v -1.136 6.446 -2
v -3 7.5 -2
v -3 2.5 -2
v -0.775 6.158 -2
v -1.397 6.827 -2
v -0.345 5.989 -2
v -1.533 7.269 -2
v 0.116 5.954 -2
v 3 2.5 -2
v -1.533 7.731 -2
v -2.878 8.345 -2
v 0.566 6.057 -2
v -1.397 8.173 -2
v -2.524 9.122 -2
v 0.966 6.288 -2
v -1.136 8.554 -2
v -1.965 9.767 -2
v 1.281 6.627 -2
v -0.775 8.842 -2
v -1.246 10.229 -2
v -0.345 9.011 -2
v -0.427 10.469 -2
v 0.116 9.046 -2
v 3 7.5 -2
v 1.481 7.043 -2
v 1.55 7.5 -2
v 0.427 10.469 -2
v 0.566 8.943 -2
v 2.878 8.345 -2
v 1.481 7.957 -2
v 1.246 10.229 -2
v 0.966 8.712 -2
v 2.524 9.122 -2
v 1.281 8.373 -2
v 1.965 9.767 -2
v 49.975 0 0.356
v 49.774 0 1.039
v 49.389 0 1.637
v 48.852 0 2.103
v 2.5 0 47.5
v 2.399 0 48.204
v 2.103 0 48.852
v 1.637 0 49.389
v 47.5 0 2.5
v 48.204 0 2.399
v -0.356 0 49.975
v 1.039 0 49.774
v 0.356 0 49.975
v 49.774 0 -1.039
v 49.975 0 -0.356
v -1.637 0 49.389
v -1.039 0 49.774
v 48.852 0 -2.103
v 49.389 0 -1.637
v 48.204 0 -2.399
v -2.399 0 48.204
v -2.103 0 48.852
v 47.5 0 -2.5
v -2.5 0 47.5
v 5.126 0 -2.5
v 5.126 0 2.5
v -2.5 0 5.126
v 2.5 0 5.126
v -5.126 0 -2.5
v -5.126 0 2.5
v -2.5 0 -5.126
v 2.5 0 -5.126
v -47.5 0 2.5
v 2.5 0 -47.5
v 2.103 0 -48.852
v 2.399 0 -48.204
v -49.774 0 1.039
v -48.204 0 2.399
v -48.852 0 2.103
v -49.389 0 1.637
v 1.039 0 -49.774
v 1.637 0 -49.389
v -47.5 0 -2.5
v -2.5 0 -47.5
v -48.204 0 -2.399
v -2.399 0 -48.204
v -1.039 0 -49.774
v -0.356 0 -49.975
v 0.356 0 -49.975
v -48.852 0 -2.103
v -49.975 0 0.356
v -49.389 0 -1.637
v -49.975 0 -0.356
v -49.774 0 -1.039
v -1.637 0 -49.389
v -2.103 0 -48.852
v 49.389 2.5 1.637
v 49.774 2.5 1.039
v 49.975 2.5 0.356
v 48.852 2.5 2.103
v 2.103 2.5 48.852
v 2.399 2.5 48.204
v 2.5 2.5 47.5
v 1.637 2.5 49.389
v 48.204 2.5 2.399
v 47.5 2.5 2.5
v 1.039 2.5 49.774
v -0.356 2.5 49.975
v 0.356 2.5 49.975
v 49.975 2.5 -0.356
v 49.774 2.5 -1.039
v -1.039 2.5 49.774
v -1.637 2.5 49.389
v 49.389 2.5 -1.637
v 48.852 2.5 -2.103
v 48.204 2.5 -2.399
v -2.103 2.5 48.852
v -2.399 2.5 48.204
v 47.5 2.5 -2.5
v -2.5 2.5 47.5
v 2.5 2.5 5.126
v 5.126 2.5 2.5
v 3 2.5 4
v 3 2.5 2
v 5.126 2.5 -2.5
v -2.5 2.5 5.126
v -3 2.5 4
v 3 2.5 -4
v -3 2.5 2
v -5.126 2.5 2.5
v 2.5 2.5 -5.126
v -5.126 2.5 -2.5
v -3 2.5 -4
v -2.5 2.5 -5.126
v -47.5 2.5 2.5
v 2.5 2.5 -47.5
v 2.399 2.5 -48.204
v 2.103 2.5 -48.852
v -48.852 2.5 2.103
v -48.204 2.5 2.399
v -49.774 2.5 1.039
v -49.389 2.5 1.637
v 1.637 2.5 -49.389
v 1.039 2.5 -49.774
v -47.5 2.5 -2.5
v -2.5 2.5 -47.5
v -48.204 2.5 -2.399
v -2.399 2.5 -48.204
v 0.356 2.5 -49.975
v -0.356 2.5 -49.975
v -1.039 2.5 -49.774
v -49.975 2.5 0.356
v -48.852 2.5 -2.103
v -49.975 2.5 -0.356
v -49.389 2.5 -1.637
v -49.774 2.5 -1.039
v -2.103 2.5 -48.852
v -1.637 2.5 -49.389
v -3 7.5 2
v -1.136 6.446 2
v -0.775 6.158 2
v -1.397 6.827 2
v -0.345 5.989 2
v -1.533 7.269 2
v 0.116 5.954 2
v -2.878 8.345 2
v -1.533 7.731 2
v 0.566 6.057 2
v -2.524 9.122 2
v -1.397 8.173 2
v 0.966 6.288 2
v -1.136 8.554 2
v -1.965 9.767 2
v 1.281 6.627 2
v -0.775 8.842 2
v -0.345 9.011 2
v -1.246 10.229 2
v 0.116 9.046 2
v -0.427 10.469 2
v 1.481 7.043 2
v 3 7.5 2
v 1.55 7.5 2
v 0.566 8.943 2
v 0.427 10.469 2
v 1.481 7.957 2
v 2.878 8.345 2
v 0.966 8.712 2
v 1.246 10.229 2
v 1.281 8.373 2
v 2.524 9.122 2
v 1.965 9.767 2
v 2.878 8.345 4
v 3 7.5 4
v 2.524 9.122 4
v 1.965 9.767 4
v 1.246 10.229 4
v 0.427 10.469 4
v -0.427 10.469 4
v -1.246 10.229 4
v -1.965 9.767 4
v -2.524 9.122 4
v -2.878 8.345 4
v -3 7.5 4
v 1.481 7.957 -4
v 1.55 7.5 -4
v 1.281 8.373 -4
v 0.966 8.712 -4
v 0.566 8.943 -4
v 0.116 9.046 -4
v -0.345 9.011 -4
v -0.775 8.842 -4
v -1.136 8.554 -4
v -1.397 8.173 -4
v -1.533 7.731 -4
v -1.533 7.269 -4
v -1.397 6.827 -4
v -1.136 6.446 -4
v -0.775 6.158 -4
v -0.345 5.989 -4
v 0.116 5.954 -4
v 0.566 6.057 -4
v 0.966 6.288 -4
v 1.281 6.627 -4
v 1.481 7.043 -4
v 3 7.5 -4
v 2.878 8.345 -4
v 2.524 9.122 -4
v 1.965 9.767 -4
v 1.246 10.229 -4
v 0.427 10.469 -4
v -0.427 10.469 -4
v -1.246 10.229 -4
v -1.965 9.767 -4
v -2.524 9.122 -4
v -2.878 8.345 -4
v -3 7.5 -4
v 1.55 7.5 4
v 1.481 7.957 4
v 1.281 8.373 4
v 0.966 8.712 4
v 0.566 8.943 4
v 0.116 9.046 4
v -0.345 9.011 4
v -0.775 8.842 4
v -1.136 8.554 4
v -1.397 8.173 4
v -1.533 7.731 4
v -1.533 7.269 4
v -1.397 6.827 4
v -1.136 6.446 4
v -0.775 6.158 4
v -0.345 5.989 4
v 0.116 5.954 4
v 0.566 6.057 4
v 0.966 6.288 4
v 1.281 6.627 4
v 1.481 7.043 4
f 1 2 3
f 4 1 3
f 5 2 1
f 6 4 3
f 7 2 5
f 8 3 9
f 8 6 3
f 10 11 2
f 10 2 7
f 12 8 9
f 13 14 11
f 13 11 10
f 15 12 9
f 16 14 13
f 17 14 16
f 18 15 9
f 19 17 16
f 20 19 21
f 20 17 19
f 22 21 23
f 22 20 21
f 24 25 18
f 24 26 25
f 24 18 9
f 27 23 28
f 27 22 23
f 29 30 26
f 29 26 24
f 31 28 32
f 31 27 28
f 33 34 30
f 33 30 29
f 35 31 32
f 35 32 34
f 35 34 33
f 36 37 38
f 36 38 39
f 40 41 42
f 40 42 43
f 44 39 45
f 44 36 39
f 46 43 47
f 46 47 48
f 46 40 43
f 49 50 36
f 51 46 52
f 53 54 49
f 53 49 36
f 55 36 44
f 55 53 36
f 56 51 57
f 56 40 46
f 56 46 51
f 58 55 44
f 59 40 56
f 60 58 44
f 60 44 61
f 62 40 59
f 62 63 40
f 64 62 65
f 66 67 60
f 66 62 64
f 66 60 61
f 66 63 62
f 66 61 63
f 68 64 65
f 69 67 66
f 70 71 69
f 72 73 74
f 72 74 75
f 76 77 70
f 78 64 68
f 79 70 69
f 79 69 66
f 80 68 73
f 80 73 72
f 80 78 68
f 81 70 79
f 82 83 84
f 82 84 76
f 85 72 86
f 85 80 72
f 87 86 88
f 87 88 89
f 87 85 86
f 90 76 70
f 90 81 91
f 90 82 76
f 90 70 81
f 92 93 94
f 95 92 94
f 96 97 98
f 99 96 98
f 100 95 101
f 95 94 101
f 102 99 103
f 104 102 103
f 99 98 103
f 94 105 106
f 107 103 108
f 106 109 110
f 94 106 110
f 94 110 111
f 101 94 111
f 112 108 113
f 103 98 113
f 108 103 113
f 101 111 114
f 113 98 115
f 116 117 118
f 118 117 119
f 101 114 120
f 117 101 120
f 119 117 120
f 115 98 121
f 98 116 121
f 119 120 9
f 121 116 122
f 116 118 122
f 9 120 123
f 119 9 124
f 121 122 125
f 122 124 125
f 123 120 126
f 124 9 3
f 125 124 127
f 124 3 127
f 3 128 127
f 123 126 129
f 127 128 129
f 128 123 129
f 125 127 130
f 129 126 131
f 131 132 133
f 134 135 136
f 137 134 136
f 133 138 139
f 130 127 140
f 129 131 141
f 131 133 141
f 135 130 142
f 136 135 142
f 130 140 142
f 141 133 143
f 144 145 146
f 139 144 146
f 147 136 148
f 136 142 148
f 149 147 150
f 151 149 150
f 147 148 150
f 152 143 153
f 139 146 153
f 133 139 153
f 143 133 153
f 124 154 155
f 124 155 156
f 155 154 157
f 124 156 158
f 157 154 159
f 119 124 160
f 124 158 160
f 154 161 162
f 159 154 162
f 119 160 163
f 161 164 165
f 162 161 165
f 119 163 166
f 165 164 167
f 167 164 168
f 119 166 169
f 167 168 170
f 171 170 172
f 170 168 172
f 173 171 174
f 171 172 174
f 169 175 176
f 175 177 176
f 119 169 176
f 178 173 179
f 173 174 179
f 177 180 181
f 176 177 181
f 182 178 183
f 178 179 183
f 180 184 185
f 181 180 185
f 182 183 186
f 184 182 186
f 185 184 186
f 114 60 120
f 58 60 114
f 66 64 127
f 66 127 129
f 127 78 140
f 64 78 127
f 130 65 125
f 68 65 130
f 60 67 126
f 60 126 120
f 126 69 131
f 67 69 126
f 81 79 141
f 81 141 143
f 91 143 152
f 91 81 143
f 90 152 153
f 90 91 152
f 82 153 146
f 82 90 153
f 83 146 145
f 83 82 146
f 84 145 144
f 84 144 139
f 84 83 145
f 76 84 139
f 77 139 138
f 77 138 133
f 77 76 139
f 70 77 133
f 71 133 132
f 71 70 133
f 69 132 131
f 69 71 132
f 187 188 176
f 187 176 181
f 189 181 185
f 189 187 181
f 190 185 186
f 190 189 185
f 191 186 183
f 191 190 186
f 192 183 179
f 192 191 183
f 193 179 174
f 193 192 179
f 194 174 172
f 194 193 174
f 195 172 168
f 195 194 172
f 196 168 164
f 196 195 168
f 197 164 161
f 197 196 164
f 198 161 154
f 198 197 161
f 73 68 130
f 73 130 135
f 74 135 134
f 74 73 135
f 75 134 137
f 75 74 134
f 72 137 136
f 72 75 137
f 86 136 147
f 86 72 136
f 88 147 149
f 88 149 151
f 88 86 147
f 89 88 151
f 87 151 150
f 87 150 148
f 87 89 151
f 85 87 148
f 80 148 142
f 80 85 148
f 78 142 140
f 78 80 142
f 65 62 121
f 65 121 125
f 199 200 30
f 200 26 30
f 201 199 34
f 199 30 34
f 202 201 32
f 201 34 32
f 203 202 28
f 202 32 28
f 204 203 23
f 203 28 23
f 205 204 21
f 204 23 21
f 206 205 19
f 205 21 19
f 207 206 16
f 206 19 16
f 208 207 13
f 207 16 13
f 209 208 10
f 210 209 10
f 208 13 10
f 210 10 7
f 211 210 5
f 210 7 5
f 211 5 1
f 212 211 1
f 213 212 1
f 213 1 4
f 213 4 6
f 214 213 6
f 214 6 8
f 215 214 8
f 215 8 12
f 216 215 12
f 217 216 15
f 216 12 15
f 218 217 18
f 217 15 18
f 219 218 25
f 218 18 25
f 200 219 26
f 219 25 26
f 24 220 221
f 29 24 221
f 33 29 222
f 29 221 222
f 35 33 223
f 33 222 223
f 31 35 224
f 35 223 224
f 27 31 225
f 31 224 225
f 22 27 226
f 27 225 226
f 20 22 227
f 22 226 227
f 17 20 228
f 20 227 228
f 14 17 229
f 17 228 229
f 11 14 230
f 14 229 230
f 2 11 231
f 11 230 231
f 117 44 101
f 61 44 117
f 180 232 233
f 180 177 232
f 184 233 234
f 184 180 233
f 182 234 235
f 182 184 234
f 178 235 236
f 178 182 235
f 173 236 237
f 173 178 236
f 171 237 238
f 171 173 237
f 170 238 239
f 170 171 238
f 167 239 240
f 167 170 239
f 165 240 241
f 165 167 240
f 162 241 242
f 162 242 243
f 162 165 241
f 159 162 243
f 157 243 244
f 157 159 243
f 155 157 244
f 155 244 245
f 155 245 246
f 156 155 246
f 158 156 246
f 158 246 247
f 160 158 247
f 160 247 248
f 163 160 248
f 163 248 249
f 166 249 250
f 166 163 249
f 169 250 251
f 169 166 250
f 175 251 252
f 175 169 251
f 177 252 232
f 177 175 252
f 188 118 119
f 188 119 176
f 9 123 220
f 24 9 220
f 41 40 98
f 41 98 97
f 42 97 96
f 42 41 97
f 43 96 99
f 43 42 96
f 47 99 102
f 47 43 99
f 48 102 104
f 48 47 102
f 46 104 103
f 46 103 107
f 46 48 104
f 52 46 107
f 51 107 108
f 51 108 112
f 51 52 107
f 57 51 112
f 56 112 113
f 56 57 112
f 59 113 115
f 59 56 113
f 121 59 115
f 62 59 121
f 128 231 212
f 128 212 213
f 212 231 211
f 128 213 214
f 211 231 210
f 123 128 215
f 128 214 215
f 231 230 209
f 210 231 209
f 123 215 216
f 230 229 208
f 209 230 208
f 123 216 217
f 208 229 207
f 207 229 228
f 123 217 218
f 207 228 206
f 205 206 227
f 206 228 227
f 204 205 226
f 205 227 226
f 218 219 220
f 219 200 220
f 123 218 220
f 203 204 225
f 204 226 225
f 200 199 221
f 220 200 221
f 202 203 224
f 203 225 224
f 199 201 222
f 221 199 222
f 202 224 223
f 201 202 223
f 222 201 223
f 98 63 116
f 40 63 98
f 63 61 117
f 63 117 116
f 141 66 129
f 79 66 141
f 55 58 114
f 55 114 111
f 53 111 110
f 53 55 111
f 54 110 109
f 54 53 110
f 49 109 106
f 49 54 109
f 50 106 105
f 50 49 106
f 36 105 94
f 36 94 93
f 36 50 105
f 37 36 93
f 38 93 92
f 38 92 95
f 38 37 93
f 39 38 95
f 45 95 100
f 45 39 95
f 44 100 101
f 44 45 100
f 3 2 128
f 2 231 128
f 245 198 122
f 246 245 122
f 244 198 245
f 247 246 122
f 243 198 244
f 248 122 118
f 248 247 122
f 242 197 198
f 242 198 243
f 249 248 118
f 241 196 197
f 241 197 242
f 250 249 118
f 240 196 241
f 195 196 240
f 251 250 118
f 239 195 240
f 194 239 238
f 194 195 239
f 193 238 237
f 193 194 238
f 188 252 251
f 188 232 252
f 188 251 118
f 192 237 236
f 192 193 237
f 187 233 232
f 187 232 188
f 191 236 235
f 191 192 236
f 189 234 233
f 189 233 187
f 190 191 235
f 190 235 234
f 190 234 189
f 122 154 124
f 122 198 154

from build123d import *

# Parameters (mm, degrees)
BOSS_EXTRUDE1_DEPTH = 2.5
SKETCH2_R           = 1.55
BOSS_EXTRUDE2_DEPTH = 1


with BuildPart() as part:
    # Sketch1 → Boss-Extrude1 (new body)
    with BuildSketch(Plane(origin=(0, 0, 0), x_dir=(1, 0, 0), z_dir=(0, 1, 0))):
        with BuildLine():
            Line((2.5, 47.5), (2.5, 5.126263096))
            Line((2.5, 5.126263096), (5.126263096, 2.5))
            Line((5.126263096, 2.5), (47.5, 2.5))
            ThreePointArc((47.5, 2.5), (50, 0), (47.5, -2.5))
            Line((47.5, -2.5), (5.126263096, -2.5))
            Line((5.126263096, -2.5), (2.5, -5.126263096))
            Line((2.5, -5.126263096), (2.5, -47.5))
            ThreePointArc((2.5, -47.5), (0, -50), (-2.5, -47.5))
            Line((-2.5, -47.5), (-2.5, -5.126263096))
            Line((-2.5, -5.126263096), (-5.126263096, -2.5))
            Line((-5.126263096, -2.5), (-47.5, -2.5))
            ThreePointArc((-47.5, -2.5), (-50, 0), (-47.5, 2.5))
            Line((-47.5, 2.5), (-5.126263096, 2.5))
            Line((-5.126263096, 2.5), (-2.5, 5.126263096))
            Line((-2.5, 5.126263096), (-2.5, 47.5))
            ThreePointArc((-2.5, 47.5), (0, 50), (2.5, 47.5))
        make_face()
    extrude(amount=BOSS_EXTRUDE1_DEPTH)

    # Sketch2 → Boss-Extrude2 (add, symmetric)
    with BuildSketch(Plane.XY.offset(3)):
        with BuildLine():
            Line((-3, 2.5), (3, 2.5))
            Line((3, 2.5), (3, 7.5))
            ThreePointArc((3, 7.5), (0, 10.5), (-3, 7.5))
            Line((-3, 7.5), (-3, 2.5))
        make_face()
        with Locations((0, 7.5)):
            Circle(SKETCH2_R, mode=Mode.SUBTRACT)
    boss_extrude2 = extrude(amount=BOSS_EXTRUDE2_DEPTH, both=True)

    # Mirror2: Boss-Extrude2 across plane
    add(boss_extrude2.mirror(Plane.XY))


solid = part.part
